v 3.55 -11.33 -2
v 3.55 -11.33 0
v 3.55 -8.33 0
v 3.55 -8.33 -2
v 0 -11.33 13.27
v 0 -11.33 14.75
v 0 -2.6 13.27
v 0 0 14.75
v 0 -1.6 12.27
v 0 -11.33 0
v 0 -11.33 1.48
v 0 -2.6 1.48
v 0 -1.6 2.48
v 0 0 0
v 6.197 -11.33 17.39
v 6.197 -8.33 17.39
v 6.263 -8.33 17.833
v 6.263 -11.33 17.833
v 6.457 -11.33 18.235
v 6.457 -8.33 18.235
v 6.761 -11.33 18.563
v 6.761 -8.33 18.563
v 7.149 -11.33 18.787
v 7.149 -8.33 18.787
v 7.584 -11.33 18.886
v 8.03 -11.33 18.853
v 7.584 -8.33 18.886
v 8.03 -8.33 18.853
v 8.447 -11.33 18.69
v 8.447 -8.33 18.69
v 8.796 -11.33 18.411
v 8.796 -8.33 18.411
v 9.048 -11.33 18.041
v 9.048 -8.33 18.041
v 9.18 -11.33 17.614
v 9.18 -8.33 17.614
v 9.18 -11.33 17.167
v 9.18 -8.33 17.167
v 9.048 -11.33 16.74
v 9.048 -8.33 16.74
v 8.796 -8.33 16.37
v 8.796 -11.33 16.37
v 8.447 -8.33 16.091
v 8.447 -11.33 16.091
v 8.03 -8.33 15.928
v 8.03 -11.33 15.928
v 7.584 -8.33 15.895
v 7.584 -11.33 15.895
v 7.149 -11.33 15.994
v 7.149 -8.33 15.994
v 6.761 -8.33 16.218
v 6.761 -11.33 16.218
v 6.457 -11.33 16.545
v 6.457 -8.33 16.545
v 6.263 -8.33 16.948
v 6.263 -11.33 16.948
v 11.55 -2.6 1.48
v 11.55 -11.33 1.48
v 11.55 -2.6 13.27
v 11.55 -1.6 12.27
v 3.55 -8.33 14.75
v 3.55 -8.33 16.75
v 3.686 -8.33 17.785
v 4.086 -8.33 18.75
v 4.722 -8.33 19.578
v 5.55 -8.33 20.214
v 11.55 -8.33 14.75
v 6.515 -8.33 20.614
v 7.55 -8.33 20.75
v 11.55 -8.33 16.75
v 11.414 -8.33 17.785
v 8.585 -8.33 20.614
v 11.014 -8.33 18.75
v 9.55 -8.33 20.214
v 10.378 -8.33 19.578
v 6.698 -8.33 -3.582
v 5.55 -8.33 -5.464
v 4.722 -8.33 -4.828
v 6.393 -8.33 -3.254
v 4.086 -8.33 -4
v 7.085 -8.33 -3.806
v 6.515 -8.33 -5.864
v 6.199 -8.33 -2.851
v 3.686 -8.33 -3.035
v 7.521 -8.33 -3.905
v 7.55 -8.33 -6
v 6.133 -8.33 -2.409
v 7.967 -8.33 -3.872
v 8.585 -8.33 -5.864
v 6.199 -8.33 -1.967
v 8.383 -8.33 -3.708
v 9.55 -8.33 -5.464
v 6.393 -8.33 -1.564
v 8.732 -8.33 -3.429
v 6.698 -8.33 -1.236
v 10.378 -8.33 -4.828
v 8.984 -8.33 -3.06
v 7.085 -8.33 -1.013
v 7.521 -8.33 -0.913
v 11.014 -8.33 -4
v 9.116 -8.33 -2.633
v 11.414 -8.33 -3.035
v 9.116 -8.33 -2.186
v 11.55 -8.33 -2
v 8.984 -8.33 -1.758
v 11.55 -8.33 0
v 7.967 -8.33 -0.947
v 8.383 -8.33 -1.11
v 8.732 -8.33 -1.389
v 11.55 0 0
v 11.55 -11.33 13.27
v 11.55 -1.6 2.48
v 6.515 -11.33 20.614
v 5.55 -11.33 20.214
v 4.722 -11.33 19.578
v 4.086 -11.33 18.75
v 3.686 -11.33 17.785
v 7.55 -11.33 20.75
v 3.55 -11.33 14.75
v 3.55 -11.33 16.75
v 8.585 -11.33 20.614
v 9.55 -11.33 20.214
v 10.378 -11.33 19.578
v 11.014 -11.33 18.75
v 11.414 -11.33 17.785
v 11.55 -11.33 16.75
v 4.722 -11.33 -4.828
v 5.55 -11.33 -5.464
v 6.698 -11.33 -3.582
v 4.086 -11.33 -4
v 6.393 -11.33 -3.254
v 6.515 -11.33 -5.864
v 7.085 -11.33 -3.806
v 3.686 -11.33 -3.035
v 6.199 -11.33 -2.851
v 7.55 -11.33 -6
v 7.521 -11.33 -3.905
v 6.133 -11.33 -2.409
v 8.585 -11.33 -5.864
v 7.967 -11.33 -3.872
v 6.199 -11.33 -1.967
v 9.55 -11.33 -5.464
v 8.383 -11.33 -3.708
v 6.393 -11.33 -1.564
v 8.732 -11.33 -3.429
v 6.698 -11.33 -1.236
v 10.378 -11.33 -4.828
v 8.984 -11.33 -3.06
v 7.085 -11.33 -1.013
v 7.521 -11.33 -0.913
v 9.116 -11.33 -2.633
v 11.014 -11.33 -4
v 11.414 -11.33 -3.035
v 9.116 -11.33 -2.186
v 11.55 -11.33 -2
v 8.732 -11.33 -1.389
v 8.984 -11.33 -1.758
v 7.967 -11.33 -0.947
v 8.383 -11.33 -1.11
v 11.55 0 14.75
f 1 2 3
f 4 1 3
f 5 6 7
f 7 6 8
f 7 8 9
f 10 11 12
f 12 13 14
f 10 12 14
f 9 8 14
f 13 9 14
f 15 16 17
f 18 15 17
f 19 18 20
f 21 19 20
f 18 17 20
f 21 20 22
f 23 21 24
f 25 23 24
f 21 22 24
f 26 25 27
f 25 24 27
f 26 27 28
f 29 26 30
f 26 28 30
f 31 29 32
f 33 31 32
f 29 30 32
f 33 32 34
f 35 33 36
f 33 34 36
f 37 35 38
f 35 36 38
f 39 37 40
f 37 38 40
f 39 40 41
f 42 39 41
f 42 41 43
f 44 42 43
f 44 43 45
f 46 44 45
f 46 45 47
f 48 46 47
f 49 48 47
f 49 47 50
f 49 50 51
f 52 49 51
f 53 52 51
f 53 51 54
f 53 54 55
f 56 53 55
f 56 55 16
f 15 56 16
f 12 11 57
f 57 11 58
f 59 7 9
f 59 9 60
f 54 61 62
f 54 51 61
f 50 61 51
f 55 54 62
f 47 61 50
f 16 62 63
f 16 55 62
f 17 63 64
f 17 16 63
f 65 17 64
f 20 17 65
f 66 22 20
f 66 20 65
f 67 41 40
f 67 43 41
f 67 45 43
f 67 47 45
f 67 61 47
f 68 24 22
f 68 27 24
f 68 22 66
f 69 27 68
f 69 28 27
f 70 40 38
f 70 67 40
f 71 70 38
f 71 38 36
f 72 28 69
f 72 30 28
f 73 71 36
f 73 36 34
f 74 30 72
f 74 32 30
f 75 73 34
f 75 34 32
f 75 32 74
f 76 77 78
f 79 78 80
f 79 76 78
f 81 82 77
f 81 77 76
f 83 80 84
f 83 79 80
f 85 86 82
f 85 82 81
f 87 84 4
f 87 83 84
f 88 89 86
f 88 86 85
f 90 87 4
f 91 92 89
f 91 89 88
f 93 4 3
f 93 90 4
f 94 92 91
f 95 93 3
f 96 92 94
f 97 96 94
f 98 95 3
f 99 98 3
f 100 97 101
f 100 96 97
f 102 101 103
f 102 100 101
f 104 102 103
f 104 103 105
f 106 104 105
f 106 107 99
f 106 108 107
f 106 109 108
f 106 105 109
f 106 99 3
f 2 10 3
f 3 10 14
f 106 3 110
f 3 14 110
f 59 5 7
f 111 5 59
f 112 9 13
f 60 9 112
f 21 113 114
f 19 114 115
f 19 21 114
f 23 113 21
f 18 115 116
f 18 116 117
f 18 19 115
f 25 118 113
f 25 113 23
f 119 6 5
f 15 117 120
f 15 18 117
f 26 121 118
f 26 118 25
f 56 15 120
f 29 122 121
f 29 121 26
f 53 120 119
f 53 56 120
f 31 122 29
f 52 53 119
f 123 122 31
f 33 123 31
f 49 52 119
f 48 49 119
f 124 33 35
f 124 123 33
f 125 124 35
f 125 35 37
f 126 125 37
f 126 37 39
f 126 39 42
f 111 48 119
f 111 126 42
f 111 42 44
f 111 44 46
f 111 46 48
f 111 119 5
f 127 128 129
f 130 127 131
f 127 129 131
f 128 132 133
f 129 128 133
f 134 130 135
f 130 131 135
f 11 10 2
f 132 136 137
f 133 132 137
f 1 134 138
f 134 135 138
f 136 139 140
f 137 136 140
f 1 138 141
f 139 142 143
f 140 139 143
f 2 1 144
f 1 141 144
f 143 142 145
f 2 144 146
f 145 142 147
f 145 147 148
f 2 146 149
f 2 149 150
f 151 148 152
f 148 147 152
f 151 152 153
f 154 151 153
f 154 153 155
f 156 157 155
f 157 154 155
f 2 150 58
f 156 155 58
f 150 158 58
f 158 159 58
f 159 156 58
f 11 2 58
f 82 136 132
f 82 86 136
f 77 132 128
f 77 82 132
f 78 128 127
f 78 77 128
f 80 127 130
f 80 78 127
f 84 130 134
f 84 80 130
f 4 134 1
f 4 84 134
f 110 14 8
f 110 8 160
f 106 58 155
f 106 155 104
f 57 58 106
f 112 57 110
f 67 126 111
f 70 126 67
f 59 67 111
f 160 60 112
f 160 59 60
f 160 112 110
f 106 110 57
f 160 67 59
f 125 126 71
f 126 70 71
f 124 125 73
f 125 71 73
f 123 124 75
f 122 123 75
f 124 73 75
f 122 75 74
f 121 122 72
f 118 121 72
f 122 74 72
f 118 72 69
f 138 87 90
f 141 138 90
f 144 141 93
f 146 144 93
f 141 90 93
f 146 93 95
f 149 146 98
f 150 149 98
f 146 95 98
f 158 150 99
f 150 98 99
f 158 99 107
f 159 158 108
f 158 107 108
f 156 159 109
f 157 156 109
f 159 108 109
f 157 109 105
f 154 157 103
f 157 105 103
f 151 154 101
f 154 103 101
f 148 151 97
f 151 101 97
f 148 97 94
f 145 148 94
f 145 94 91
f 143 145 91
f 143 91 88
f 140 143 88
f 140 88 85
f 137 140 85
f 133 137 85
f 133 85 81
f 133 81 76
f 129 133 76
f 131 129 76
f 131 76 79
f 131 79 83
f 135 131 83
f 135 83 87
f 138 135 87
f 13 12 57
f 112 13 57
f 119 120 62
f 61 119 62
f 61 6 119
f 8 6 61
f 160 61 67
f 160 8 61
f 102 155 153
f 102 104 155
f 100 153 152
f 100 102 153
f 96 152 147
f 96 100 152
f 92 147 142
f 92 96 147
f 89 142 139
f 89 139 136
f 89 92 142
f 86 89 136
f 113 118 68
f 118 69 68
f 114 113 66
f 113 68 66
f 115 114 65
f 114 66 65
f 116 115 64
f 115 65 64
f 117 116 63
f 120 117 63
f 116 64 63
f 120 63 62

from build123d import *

# Parameters (mm, degrees)
F0_W      = 11.55
F0_H      = 1.48
F0_H_2    = 11.79
F1_DEPTH  = 11.33
F2_W      = 11.55
F2_H      = 11.79
F3_DEPTH  = 9.73
F4_W      = 3
F4_H      = 6
F5_DEPTH  = 8
F6_W      = 3
F6_H      = 6
F7_DEPTH  = 8
F8_R      = 4
F9_R      = 3.99999
F10_R     = 4
F11_R     = 3.99999
F12_R     = 1.5
F13_DEPTH = 25
F14_R     = 1.5
F15_DEPTH = 25
F16_SIZE  = 1
F17_SIZE  = 1


# Not quite as in the source:
# - a fillet or chamfer is up to 0.001 mm smaller than in the source, because OpenCascade refuses the exact size


with BuildPart() as f1:
    # F0 (on Front) → F1 (new body)
    with BuildSketch(Plane.XZ):
        with Locations((5.775, 0.74)):
            Rectangle(F0_W, F0_H)
        with Locations((5.775, 14.01)):
            Rectangle(F0_W, F0_H)
        with Locations((5.775, 7.375)):
            Rectangle(F0_W, F0_H_2)
    extrude(amount=F1_DEPTH)

    # F2 (on face) → F3 (cut)
    with BuildSketch(Plane.XZ.offset(11.33)):
        with Locations((5.775, 7.375)):
            Rectangle(F2_W, F2_H)
    extrude(amount=-F3_DEPTH, mode=Mode.SUBTRACT)

    # F4 (on face) → F5 (join)
    with BuildSketch(Plane.YZ.offset(11.55)):
        with Locations((-9.83, 17.75)):
            Rectangle(F4_W, F4_H)
        Polygon((-8.33, 14.75), (-11.33, 14.75), (-11.33, 13.27), (-1.6, 13.27), (-1.6, 1.48), (-11.33, 1.48), (-11.33, 0), (0, 0), (0, 14.75), align=None)
    extrude(amount=-F5_DEPTH)

    # F6 (on face) → F7 (join)
    with BuildSketch(Plane.YZ.offset(11.55)):
        with Locations((-9.83, -3)):
            Rectangle(F6_W, F6_H)
    extrude(amount=-F7_DEPTH)

    # F8
    f8_edges = [f1.edges().sort_by_distance(p)[0] for p in [
        (11.55, -9.83, 20.75),
    ]]
    fillet(f8_edges, radius=F8_R)

    # F9 (radius 4 in the source; OpenCascade refuses exactly that, so slightly less here)
    f9_edges = [f1.edges().sort_by_distance(p)[0] for p in [
        (3.55, -9.83, 20.75),
    ]]
    fillet(f9_edges, radius=F9_R)

    # F10
    f10_edges = [f1.edges().sort_by_distance(p)[0] for p in [
        (11.55, -9.83, -6),
    ]]
    fillet(f10_edges, radius=F10_R)

    # F11 (radius 4 in the source; OpenCascade refuses exactly that, so slightly less here)
    f11_edges = [f1.edges().sort_by_distance(p)[0] for p in [
        (3.55, -9.83, -6),
    ]]
    fillet(f11_edges, radius=F11_R)

    # F12 (on face) → F13 (cut)
    with BuildSketch(Plane(origin=(0, -8.33, 0), x_dir=(-1, 0, 0), z_dir=(0, 1, 0))):
        with Locations((-7.6327412389, -2.4092334788)):
            Circle(F12_R)
    extrude(amount=-F13_DEPTH, mode=Mode.SUBTRACT)

    # F14 (on face) → F15 (cut)
    with BuildSketch(Plane(origin=(0, -8.33, 0), x_dir=(-1, 0, 0), z_dir=(0, 1, 0))):
        with Locations((-7.6965787448, 17.3904672265)):
            Circle(F14_R)
    extrude(amount=-F15_DEPTH, mode=Mode.SUBTRACT)

    # F16
    f16_edges = [f1.edges().sort_by_distance(p)[0] for p in [
        (5.775, -1.6, 13.27),
    ]]
    chamfer(f16_edges, length=F16_SIZE)

    # F17
    f17_edges = [f1.edges().sort_by_distance(p)[0] for p in [
        (5.775, -1.6, 1.48),
    ]]
    chamfer(f17_edges, length=F17_SIZE)


solid = f1.part
